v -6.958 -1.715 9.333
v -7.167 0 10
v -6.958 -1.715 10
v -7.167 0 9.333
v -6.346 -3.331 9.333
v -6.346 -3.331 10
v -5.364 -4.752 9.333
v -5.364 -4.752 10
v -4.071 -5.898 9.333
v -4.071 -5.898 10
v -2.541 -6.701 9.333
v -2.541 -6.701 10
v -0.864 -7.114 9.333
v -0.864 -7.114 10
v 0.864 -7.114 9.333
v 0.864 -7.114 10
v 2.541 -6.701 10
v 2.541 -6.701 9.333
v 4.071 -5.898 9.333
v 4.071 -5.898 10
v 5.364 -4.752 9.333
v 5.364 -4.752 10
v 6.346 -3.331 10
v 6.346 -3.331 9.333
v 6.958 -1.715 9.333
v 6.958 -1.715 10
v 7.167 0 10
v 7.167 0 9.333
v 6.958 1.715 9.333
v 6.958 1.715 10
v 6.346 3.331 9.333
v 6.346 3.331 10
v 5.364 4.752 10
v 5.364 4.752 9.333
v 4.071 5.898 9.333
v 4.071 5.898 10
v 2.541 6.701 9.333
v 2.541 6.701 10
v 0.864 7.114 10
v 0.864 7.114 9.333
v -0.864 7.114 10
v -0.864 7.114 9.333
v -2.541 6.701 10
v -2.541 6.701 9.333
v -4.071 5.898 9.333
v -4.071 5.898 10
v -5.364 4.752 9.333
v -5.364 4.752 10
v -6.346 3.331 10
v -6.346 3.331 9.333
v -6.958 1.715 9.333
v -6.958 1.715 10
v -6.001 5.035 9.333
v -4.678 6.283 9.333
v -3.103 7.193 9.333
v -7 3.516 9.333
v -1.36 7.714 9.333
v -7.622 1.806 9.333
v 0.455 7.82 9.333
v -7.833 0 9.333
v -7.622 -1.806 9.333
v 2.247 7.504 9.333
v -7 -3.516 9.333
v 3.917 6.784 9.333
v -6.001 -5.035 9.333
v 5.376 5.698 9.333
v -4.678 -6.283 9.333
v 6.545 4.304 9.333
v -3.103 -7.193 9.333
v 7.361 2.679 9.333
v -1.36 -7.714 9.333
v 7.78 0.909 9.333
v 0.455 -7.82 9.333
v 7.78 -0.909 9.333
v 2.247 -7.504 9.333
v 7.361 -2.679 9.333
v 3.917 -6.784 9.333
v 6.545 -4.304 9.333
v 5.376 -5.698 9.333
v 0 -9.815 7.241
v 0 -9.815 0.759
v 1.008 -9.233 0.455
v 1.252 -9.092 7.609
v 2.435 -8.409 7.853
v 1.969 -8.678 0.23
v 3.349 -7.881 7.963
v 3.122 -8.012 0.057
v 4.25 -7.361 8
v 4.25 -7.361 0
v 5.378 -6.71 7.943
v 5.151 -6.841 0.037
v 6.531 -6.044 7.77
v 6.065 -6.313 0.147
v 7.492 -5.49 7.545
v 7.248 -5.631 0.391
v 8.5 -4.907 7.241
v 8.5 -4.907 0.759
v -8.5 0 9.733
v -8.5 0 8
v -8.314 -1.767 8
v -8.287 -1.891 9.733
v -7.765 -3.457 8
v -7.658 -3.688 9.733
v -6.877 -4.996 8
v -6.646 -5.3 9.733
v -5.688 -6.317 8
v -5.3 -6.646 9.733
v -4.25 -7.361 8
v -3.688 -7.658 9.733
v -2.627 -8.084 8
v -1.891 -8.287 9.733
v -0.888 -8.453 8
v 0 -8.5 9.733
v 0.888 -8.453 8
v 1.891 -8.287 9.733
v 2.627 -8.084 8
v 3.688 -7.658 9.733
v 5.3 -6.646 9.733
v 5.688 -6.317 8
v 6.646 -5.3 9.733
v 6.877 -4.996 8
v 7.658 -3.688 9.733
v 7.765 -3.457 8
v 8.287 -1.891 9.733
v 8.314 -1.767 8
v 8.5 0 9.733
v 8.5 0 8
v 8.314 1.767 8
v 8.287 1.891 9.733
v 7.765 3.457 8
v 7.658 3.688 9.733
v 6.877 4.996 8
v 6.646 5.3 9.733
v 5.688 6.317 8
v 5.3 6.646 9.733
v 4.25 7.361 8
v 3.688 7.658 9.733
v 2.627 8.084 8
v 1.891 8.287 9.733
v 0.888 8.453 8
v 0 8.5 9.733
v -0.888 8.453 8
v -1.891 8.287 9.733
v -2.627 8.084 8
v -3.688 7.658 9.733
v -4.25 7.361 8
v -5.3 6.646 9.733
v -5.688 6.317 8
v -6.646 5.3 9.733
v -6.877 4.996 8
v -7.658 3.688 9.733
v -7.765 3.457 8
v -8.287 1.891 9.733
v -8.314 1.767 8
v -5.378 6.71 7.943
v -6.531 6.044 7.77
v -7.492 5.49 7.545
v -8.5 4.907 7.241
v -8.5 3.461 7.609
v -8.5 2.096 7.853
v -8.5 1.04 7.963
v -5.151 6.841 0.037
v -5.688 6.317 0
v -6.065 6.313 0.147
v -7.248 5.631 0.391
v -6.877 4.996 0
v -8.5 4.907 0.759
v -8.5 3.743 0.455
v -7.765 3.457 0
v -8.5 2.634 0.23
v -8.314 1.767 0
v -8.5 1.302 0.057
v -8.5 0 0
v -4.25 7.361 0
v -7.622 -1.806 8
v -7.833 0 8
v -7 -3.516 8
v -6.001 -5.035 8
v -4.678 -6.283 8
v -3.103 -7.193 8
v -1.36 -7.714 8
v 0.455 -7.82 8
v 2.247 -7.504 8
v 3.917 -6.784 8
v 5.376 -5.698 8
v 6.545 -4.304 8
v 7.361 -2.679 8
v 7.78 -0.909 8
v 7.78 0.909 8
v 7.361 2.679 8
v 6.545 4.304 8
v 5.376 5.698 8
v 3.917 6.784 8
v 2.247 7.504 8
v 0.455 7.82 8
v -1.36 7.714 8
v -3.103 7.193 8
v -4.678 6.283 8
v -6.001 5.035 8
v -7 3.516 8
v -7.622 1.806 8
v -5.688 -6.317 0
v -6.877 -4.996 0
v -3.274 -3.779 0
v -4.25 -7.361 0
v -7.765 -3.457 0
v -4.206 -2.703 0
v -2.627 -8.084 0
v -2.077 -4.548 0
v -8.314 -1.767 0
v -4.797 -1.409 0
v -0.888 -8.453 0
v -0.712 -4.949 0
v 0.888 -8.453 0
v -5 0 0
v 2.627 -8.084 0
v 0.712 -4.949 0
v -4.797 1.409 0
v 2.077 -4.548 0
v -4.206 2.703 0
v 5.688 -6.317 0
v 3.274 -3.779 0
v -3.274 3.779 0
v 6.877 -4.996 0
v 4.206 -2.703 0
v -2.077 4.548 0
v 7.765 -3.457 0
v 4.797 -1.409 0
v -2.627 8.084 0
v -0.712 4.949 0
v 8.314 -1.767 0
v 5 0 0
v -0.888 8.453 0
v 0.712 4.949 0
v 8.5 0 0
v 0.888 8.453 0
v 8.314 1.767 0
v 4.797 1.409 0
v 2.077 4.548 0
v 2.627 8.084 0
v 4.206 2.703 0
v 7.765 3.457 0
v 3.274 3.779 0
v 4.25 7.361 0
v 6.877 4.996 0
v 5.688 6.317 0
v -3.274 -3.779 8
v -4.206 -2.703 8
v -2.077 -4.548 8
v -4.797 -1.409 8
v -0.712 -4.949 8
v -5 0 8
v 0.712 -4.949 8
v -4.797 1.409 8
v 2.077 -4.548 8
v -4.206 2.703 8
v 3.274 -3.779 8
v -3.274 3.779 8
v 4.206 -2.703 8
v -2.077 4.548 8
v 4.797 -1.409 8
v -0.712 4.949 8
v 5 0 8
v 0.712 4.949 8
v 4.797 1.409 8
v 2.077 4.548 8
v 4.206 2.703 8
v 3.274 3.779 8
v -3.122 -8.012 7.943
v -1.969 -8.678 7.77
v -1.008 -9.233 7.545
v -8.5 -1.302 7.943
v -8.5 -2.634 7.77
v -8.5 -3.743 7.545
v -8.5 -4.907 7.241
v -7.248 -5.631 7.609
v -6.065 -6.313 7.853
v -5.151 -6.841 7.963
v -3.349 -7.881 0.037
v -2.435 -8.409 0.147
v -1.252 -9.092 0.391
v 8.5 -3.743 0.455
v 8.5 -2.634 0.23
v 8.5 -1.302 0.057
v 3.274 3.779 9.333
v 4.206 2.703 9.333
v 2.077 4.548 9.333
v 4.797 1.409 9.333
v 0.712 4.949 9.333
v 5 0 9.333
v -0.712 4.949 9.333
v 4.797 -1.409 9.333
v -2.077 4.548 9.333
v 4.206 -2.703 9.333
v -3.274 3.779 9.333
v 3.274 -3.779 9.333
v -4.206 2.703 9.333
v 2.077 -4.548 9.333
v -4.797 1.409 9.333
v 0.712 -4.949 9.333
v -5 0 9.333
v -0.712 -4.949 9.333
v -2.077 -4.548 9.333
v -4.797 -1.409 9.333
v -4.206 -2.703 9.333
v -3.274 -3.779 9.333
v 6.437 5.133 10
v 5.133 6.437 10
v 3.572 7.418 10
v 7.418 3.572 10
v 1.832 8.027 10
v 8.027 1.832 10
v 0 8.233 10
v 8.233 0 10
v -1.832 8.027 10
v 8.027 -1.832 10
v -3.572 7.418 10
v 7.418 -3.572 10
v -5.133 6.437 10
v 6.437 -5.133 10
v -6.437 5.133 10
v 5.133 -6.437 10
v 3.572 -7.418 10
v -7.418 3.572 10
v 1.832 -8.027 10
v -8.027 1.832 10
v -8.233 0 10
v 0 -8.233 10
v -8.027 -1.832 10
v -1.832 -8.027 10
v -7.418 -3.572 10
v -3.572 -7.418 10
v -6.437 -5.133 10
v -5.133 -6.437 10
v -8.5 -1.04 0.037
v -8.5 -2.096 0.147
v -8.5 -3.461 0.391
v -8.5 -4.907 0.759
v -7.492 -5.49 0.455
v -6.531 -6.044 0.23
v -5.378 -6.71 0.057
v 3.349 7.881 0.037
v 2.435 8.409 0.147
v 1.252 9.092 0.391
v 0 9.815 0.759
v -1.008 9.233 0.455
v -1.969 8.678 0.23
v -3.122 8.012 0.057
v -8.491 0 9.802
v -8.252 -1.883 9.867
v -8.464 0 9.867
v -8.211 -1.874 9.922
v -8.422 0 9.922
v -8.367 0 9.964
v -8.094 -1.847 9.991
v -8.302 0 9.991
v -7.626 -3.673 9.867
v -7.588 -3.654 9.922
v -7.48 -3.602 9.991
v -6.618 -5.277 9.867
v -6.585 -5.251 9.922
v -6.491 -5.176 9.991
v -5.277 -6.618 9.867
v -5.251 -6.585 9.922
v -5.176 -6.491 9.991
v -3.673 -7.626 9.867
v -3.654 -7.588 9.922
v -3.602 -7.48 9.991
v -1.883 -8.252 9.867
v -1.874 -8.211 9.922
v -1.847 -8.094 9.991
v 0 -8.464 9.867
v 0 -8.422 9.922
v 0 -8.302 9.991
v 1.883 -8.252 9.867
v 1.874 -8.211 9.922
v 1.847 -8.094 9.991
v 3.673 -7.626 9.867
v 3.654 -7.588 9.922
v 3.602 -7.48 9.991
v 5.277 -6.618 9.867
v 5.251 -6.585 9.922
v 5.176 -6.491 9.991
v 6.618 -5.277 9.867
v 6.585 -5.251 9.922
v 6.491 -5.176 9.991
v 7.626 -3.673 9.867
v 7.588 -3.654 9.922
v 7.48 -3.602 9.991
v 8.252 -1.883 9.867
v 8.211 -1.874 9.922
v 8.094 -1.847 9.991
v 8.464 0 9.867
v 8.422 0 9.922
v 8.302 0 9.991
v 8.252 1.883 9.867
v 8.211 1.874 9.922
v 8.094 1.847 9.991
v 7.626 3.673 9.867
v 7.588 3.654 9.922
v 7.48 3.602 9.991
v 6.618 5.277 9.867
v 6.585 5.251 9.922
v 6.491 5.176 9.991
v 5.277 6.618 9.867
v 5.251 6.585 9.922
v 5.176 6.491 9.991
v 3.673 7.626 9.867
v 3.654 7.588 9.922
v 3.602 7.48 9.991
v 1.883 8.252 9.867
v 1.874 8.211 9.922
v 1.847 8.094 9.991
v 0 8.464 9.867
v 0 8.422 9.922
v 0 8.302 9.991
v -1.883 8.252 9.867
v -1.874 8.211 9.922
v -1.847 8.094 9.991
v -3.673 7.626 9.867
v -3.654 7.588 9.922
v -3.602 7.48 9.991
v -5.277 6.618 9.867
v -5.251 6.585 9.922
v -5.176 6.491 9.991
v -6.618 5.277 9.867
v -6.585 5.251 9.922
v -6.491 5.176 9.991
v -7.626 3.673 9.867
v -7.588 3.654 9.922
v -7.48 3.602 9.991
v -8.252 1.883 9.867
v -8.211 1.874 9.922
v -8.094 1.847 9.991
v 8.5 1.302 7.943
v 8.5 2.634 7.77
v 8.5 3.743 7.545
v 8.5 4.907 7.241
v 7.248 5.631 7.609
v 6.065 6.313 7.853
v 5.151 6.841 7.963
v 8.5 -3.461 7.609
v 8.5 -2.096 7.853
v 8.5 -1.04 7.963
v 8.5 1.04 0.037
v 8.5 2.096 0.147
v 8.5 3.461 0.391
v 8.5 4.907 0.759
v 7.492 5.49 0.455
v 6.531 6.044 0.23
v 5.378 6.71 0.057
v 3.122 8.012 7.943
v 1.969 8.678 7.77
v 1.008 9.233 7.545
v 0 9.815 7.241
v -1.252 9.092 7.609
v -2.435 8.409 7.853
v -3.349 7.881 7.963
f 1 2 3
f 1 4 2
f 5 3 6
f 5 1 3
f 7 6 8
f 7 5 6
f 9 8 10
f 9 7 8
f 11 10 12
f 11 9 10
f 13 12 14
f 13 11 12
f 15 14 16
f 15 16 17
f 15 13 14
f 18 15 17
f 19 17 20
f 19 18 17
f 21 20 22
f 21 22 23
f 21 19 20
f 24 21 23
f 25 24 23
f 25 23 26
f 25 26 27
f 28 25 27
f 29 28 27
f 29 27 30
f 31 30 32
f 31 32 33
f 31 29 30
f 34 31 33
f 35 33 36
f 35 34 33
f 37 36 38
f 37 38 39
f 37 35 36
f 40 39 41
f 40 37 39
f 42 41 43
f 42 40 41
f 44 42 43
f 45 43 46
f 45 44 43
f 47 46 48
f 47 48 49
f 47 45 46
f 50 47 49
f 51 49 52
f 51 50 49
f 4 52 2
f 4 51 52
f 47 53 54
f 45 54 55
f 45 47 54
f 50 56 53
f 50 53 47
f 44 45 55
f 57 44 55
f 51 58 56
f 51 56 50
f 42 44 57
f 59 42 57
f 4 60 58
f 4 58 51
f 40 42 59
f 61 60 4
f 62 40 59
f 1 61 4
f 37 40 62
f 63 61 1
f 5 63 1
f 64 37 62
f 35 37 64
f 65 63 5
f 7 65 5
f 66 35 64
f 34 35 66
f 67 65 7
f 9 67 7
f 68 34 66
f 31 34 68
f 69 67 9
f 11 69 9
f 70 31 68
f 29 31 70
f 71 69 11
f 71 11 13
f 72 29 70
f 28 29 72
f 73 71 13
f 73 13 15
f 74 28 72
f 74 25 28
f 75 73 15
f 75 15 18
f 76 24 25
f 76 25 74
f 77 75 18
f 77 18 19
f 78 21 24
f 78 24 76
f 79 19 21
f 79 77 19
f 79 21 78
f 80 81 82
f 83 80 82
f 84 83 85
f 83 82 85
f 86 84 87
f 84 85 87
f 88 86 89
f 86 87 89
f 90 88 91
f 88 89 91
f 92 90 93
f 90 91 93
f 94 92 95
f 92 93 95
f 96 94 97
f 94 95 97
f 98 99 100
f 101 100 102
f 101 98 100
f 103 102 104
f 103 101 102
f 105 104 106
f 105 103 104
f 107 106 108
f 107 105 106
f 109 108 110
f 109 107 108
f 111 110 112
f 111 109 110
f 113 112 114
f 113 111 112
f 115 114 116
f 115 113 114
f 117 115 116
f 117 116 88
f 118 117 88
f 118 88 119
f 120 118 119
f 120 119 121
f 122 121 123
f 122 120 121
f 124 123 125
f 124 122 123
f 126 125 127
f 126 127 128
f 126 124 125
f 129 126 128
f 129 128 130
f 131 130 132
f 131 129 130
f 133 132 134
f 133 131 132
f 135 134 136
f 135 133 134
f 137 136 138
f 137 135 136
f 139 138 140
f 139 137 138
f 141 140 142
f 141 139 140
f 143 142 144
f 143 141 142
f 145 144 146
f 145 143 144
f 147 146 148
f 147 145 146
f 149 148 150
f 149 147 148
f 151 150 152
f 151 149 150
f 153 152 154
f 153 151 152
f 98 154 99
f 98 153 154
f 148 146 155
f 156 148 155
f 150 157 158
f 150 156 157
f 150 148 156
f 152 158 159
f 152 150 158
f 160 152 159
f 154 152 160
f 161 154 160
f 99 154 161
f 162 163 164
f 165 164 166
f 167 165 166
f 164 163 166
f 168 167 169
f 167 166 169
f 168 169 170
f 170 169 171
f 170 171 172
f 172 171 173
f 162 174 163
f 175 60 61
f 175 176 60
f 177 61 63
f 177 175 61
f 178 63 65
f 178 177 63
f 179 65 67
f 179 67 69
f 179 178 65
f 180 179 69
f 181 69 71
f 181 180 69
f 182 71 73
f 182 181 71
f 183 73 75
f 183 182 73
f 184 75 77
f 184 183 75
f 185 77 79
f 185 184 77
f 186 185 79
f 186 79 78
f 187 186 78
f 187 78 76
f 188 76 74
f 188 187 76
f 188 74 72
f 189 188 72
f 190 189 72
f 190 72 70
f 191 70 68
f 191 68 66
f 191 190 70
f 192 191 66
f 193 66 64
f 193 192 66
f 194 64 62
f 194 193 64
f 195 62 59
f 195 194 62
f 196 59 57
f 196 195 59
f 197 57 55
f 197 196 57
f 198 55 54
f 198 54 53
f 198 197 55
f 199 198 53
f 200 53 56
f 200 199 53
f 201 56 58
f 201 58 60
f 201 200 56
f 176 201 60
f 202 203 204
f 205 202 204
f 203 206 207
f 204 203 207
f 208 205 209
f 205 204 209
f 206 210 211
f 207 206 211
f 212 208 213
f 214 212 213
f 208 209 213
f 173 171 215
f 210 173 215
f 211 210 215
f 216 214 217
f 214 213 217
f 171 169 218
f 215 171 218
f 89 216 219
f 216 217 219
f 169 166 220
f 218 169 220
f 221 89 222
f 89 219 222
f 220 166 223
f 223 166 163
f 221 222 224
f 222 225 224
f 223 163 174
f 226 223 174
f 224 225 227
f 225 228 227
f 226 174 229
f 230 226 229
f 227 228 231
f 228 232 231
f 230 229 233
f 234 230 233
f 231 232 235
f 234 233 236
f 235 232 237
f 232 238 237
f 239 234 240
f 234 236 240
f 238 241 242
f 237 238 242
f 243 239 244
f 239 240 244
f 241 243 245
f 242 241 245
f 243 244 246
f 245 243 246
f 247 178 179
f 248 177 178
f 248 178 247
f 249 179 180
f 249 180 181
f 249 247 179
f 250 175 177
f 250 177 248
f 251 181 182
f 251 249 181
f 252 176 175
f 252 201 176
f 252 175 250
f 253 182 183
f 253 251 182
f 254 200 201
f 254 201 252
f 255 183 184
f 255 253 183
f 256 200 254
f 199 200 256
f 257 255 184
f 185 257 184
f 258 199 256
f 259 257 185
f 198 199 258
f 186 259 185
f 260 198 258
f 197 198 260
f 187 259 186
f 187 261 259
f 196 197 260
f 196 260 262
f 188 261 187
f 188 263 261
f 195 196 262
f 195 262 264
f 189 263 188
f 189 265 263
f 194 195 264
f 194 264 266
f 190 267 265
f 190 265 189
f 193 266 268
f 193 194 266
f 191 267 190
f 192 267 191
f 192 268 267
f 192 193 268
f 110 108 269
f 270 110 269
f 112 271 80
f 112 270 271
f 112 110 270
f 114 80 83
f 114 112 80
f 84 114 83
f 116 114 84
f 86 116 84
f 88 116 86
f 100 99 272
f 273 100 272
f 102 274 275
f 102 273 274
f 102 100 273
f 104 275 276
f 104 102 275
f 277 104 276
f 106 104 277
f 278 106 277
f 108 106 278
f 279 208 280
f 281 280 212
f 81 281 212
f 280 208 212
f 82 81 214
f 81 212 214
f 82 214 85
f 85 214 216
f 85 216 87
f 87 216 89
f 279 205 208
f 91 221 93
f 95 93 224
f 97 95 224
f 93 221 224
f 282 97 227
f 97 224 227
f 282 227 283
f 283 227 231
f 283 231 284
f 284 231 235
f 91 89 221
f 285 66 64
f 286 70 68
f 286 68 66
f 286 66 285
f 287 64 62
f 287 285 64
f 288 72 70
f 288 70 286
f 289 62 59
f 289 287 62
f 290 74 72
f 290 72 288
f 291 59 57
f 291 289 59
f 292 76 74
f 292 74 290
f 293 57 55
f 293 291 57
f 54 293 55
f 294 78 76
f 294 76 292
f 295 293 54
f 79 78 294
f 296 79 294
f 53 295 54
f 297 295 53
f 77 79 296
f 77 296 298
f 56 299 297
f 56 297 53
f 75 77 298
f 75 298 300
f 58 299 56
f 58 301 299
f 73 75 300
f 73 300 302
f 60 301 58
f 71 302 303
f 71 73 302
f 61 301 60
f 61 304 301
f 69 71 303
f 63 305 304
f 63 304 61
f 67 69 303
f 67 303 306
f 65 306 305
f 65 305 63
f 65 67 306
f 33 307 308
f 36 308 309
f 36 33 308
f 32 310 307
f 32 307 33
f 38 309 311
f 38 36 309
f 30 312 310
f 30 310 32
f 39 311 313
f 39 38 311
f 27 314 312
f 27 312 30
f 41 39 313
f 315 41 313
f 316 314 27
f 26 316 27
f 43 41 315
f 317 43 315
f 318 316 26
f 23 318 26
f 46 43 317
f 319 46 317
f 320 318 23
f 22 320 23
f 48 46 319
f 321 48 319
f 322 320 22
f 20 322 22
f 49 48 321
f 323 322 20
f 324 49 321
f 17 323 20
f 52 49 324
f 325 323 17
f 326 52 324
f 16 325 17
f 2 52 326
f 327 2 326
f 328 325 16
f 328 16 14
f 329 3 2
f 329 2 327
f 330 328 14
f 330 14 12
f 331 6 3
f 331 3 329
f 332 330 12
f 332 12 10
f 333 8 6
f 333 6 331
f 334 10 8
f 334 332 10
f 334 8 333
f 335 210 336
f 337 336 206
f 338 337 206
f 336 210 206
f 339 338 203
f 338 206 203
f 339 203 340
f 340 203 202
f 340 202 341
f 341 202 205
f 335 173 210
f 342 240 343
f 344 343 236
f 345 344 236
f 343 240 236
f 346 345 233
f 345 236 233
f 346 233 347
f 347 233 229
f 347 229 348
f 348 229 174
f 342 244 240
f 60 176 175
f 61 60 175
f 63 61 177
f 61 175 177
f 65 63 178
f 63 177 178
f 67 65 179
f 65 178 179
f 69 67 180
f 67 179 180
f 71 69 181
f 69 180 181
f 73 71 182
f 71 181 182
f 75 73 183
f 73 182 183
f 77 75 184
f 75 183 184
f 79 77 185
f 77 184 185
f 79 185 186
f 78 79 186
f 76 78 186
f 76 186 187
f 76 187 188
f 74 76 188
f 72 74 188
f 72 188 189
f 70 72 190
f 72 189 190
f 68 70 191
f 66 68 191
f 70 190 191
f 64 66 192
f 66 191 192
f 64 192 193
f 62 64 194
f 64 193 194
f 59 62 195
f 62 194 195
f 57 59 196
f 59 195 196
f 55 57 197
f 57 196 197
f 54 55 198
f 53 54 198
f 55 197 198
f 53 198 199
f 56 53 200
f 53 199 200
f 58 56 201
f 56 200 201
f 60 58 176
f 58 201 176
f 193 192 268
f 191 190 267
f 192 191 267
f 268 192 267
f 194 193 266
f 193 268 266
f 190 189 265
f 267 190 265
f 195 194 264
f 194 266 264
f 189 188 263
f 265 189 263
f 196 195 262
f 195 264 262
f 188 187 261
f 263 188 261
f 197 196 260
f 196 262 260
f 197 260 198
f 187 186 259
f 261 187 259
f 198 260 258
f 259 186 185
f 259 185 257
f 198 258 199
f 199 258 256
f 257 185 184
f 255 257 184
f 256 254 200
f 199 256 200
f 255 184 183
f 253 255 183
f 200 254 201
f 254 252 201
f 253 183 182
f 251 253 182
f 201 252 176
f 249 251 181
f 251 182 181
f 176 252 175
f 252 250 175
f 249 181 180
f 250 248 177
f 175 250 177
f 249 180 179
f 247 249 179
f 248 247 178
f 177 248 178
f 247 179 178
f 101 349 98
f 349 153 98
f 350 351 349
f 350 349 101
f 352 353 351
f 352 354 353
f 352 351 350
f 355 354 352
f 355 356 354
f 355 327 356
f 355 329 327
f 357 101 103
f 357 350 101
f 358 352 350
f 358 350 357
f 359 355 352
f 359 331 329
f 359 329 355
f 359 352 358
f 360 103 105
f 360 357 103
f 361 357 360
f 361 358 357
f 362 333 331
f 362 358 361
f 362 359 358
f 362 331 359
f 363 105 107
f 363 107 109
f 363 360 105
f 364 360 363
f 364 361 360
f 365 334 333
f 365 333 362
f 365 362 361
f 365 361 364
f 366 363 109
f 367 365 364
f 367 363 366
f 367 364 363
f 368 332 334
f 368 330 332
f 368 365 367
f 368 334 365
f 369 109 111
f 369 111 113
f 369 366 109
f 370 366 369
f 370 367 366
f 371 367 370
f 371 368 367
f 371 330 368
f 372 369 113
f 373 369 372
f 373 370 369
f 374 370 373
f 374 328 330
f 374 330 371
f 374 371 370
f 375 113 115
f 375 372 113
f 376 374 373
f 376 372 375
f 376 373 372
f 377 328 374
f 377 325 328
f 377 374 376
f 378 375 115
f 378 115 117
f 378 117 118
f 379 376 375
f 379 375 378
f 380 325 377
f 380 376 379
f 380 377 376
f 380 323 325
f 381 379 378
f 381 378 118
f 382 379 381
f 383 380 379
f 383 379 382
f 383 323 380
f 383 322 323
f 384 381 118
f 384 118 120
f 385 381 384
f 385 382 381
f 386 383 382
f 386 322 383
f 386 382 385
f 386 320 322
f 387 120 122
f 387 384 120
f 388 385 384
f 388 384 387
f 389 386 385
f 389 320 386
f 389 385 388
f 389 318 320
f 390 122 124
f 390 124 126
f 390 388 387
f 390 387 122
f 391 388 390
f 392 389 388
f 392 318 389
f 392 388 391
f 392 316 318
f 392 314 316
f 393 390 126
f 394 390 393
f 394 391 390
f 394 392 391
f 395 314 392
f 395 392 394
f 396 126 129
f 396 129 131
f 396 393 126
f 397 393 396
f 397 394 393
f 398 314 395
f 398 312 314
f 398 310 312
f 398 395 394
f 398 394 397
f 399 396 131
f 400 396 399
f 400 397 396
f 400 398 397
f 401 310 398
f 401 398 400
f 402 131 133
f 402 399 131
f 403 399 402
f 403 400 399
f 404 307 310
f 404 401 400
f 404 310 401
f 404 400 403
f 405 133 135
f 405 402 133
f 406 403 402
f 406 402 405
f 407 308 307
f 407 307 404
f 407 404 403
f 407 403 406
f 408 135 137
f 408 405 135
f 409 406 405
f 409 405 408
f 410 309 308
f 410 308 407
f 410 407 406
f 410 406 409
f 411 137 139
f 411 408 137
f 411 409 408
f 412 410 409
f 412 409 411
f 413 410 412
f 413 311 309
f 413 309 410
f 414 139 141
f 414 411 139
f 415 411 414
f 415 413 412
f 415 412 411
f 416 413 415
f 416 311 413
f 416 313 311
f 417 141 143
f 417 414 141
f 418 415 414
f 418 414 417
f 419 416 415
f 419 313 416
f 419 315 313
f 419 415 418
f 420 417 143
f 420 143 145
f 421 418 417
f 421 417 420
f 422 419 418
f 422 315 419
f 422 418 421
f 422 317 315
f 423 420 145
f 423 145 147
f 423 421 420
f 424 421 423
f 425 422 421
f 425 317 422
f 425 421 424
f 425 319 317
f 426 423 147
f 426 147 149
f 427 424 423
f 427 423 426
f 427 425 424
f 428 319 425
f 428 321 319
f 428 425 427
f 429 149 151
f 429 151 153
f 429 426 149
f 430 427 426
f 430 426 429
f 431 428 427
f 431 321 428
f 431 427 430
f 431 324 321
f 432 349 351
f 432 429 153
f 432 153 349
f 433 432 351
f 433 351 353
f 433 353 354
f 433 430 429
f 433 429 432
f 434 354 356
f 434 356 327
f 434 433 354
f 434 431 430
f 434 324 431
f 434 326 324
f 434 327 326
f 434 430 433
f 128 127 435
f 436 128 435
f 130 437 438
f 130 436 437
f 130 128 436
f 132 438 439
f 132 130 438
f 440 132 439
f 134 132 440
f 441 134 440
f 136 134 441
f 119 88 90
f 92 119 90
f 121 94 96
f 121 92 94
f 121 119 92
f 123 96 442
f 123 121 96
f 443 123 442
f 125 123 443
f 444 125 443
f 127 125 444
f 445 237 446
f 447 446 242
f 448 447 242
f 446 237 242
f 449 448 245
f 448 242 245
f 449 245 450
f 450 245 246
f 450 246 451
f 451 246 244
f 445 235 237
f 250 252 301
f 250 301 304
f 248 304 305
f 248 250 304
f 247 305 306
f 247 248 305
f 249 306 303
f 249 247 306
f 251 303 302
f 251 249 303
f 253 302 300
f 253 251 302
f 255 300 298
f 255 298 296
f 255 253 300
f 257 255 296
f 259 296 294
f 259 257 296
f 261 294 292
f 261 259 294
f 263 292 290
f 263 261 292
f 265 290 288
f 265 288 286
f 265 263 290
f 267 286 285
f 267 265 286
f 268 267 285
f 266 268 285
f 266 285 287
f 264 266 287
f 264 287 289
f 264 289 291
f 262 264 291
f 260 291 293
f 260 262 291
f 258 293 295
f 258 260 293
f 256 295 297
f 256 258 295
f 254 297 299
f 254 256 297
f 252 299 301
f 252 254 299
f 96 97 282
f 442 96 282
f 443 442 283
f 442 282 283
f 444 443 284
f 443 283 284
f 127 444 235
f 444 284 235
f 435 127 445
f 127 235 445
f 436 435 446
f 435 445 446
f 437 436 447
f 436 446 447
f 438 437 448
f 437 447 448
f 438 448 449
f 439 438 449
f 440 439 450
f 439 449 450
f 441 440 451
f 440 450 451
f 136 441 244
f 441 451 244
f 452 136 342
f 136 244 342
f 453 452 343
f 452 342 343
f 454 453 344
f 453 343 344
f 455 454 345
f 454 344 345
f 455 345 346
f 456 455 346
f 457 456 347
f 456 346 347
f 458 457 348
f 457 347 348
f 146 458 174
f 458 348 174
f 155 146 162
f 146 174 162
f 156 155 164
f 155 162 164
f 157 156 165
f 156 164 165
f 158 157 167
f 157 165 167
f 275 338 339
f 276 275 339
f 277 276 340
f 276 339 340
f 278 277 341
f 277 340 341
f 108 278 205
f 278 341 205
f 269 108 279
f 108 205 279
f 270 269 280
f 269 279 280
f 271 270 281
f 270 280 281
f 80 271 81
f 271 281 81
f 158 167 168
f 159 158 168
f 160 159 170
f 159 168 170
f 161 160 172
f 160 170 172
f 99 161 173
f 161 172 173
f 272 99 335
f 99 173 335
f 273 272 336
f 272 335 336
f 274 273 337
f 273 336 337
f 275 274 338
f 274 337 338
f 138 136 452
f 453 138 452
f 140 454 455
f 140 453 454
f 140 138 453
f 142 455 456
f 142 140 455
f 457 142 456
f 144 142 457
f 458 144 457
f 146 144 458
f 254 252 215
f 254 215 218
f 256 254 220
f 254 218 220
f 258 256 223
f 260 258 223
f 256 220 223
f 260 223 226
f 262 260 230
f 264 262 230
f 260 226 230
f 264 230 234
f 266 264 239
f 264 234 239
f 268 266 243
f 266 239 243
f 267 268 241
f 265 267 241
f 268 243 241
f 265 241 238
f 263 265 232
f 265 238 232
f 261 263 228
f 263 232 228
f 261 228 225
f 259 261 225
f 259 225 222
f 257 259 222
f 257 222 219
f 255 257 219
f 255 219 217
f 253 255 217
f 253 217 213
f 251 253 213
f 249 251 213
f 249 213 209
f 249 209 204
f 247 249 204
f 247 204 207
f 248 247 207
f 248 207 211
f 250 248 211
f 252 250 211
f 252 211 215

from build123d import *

# Parameters (mm, degrees)
EXTRUDE1_DEPTH     = 8
SKETCH5_R          = 7.833333333
SKETCH5_R_2        = 5
EXTRUDE2_DEPTH     = 1.333333333
SKETCH4_R          = 5
CUT_EXTRUDE1_DEPTH = 17.388512237
FILLET2_R          = 0.266666667


with BuildPart() as part:
    # Sketch1 → Extrude1 (new body)
    with BuildSketch(Plane.XY):
        Polygon((0, 9.814954576), (-8.5, 4.907477288), (-8.5, -4.907477288), (0, -9.814954576), (8.5, -4.907477288), (8.5, 4.907477288), align=None)
    extrude(amount=EXTRUDE1_DEPTH)

    # Sketch2 → Cut-Revolve1 (revolve, cut)
    with BuildSketch(Plane(origin=(0, 0, 0), x_dir=(1, 0, 0), z_dir=(0, 1, 0))):
        Polygon((8.5, -8), (11.9, -8), (11.9, -6.037009085), align=None)
    cut_revolve1 = revolve(axis=Axis((0, 0, 0), (0, 0, 1)), mode=Mode.SUBTRACT)

    # Mirror1: Cut-Revolve1 across plane
    add(cut_revolve1.mirror(Plane(origin=(0, 0, 4), x_dir=(1, 0, 0), z_dir=(0, 0, -1))), mode=Mode.SUBTRACT)

    # Sketch3 → Revolve1 (revolve)
    with BuildSketch(Plane(origin=(0, 0, 0), x_dir=(1, 0, 0), z_dir=(0, 1, 0)), mode=Mode.PRIVATE) as revolve1_sk:
        Polygon((8.5, -8), (8.5, -10), (7.166666667, -10), (7.166666667, -9.333333333), (7.833333333, -9.333333333), (7.833333333, -8), align=None)
    revolve(revolve1_sk.sketch.rotate(Axis((0, 0, 0), (0, 0, 1)), 180), axis=Axis((0, 0, 0), (0, 0, 1)))

    # Sketch4 → Cut-Extrude1 (cut, through all)
    with BuildSketch(Plane(origin=(0, 0, 0), x_dir=(-1, 0, 0), z_dir=(0, 0, -1))):
        Circle(SKETCH4_R)
    extrude(amount=-CUT_EXTRUDE1_DEPTH, mode=Mode.SUBTRACT)

    # Fillet2
    fillet2_edges = [part.edges().sort_by_distance(p)[0] for p in [
        (8.5, 0, 10),
    ]]
    fillet(fillet2_edges, radius=FILLET2_R)


with BuildPart() as body_2:
    # Sketch5 → Extrude2 (new body)
    with BuildSketch(Plane.XY.offset(8)):
        with Locations(Location((0, 0, 0), (0, 0, 180))):
            Circle(SKETCH5_R)
        with Locations(Location((0, 0, 0), (0, 0, 180))):
            Circle(SKETCH5_R_2, mode=Mode.SUBTRACT)
    extrude(amount=EXTRUDE2_DEPTH)


solid = Compound([part.part, body_2.part])
